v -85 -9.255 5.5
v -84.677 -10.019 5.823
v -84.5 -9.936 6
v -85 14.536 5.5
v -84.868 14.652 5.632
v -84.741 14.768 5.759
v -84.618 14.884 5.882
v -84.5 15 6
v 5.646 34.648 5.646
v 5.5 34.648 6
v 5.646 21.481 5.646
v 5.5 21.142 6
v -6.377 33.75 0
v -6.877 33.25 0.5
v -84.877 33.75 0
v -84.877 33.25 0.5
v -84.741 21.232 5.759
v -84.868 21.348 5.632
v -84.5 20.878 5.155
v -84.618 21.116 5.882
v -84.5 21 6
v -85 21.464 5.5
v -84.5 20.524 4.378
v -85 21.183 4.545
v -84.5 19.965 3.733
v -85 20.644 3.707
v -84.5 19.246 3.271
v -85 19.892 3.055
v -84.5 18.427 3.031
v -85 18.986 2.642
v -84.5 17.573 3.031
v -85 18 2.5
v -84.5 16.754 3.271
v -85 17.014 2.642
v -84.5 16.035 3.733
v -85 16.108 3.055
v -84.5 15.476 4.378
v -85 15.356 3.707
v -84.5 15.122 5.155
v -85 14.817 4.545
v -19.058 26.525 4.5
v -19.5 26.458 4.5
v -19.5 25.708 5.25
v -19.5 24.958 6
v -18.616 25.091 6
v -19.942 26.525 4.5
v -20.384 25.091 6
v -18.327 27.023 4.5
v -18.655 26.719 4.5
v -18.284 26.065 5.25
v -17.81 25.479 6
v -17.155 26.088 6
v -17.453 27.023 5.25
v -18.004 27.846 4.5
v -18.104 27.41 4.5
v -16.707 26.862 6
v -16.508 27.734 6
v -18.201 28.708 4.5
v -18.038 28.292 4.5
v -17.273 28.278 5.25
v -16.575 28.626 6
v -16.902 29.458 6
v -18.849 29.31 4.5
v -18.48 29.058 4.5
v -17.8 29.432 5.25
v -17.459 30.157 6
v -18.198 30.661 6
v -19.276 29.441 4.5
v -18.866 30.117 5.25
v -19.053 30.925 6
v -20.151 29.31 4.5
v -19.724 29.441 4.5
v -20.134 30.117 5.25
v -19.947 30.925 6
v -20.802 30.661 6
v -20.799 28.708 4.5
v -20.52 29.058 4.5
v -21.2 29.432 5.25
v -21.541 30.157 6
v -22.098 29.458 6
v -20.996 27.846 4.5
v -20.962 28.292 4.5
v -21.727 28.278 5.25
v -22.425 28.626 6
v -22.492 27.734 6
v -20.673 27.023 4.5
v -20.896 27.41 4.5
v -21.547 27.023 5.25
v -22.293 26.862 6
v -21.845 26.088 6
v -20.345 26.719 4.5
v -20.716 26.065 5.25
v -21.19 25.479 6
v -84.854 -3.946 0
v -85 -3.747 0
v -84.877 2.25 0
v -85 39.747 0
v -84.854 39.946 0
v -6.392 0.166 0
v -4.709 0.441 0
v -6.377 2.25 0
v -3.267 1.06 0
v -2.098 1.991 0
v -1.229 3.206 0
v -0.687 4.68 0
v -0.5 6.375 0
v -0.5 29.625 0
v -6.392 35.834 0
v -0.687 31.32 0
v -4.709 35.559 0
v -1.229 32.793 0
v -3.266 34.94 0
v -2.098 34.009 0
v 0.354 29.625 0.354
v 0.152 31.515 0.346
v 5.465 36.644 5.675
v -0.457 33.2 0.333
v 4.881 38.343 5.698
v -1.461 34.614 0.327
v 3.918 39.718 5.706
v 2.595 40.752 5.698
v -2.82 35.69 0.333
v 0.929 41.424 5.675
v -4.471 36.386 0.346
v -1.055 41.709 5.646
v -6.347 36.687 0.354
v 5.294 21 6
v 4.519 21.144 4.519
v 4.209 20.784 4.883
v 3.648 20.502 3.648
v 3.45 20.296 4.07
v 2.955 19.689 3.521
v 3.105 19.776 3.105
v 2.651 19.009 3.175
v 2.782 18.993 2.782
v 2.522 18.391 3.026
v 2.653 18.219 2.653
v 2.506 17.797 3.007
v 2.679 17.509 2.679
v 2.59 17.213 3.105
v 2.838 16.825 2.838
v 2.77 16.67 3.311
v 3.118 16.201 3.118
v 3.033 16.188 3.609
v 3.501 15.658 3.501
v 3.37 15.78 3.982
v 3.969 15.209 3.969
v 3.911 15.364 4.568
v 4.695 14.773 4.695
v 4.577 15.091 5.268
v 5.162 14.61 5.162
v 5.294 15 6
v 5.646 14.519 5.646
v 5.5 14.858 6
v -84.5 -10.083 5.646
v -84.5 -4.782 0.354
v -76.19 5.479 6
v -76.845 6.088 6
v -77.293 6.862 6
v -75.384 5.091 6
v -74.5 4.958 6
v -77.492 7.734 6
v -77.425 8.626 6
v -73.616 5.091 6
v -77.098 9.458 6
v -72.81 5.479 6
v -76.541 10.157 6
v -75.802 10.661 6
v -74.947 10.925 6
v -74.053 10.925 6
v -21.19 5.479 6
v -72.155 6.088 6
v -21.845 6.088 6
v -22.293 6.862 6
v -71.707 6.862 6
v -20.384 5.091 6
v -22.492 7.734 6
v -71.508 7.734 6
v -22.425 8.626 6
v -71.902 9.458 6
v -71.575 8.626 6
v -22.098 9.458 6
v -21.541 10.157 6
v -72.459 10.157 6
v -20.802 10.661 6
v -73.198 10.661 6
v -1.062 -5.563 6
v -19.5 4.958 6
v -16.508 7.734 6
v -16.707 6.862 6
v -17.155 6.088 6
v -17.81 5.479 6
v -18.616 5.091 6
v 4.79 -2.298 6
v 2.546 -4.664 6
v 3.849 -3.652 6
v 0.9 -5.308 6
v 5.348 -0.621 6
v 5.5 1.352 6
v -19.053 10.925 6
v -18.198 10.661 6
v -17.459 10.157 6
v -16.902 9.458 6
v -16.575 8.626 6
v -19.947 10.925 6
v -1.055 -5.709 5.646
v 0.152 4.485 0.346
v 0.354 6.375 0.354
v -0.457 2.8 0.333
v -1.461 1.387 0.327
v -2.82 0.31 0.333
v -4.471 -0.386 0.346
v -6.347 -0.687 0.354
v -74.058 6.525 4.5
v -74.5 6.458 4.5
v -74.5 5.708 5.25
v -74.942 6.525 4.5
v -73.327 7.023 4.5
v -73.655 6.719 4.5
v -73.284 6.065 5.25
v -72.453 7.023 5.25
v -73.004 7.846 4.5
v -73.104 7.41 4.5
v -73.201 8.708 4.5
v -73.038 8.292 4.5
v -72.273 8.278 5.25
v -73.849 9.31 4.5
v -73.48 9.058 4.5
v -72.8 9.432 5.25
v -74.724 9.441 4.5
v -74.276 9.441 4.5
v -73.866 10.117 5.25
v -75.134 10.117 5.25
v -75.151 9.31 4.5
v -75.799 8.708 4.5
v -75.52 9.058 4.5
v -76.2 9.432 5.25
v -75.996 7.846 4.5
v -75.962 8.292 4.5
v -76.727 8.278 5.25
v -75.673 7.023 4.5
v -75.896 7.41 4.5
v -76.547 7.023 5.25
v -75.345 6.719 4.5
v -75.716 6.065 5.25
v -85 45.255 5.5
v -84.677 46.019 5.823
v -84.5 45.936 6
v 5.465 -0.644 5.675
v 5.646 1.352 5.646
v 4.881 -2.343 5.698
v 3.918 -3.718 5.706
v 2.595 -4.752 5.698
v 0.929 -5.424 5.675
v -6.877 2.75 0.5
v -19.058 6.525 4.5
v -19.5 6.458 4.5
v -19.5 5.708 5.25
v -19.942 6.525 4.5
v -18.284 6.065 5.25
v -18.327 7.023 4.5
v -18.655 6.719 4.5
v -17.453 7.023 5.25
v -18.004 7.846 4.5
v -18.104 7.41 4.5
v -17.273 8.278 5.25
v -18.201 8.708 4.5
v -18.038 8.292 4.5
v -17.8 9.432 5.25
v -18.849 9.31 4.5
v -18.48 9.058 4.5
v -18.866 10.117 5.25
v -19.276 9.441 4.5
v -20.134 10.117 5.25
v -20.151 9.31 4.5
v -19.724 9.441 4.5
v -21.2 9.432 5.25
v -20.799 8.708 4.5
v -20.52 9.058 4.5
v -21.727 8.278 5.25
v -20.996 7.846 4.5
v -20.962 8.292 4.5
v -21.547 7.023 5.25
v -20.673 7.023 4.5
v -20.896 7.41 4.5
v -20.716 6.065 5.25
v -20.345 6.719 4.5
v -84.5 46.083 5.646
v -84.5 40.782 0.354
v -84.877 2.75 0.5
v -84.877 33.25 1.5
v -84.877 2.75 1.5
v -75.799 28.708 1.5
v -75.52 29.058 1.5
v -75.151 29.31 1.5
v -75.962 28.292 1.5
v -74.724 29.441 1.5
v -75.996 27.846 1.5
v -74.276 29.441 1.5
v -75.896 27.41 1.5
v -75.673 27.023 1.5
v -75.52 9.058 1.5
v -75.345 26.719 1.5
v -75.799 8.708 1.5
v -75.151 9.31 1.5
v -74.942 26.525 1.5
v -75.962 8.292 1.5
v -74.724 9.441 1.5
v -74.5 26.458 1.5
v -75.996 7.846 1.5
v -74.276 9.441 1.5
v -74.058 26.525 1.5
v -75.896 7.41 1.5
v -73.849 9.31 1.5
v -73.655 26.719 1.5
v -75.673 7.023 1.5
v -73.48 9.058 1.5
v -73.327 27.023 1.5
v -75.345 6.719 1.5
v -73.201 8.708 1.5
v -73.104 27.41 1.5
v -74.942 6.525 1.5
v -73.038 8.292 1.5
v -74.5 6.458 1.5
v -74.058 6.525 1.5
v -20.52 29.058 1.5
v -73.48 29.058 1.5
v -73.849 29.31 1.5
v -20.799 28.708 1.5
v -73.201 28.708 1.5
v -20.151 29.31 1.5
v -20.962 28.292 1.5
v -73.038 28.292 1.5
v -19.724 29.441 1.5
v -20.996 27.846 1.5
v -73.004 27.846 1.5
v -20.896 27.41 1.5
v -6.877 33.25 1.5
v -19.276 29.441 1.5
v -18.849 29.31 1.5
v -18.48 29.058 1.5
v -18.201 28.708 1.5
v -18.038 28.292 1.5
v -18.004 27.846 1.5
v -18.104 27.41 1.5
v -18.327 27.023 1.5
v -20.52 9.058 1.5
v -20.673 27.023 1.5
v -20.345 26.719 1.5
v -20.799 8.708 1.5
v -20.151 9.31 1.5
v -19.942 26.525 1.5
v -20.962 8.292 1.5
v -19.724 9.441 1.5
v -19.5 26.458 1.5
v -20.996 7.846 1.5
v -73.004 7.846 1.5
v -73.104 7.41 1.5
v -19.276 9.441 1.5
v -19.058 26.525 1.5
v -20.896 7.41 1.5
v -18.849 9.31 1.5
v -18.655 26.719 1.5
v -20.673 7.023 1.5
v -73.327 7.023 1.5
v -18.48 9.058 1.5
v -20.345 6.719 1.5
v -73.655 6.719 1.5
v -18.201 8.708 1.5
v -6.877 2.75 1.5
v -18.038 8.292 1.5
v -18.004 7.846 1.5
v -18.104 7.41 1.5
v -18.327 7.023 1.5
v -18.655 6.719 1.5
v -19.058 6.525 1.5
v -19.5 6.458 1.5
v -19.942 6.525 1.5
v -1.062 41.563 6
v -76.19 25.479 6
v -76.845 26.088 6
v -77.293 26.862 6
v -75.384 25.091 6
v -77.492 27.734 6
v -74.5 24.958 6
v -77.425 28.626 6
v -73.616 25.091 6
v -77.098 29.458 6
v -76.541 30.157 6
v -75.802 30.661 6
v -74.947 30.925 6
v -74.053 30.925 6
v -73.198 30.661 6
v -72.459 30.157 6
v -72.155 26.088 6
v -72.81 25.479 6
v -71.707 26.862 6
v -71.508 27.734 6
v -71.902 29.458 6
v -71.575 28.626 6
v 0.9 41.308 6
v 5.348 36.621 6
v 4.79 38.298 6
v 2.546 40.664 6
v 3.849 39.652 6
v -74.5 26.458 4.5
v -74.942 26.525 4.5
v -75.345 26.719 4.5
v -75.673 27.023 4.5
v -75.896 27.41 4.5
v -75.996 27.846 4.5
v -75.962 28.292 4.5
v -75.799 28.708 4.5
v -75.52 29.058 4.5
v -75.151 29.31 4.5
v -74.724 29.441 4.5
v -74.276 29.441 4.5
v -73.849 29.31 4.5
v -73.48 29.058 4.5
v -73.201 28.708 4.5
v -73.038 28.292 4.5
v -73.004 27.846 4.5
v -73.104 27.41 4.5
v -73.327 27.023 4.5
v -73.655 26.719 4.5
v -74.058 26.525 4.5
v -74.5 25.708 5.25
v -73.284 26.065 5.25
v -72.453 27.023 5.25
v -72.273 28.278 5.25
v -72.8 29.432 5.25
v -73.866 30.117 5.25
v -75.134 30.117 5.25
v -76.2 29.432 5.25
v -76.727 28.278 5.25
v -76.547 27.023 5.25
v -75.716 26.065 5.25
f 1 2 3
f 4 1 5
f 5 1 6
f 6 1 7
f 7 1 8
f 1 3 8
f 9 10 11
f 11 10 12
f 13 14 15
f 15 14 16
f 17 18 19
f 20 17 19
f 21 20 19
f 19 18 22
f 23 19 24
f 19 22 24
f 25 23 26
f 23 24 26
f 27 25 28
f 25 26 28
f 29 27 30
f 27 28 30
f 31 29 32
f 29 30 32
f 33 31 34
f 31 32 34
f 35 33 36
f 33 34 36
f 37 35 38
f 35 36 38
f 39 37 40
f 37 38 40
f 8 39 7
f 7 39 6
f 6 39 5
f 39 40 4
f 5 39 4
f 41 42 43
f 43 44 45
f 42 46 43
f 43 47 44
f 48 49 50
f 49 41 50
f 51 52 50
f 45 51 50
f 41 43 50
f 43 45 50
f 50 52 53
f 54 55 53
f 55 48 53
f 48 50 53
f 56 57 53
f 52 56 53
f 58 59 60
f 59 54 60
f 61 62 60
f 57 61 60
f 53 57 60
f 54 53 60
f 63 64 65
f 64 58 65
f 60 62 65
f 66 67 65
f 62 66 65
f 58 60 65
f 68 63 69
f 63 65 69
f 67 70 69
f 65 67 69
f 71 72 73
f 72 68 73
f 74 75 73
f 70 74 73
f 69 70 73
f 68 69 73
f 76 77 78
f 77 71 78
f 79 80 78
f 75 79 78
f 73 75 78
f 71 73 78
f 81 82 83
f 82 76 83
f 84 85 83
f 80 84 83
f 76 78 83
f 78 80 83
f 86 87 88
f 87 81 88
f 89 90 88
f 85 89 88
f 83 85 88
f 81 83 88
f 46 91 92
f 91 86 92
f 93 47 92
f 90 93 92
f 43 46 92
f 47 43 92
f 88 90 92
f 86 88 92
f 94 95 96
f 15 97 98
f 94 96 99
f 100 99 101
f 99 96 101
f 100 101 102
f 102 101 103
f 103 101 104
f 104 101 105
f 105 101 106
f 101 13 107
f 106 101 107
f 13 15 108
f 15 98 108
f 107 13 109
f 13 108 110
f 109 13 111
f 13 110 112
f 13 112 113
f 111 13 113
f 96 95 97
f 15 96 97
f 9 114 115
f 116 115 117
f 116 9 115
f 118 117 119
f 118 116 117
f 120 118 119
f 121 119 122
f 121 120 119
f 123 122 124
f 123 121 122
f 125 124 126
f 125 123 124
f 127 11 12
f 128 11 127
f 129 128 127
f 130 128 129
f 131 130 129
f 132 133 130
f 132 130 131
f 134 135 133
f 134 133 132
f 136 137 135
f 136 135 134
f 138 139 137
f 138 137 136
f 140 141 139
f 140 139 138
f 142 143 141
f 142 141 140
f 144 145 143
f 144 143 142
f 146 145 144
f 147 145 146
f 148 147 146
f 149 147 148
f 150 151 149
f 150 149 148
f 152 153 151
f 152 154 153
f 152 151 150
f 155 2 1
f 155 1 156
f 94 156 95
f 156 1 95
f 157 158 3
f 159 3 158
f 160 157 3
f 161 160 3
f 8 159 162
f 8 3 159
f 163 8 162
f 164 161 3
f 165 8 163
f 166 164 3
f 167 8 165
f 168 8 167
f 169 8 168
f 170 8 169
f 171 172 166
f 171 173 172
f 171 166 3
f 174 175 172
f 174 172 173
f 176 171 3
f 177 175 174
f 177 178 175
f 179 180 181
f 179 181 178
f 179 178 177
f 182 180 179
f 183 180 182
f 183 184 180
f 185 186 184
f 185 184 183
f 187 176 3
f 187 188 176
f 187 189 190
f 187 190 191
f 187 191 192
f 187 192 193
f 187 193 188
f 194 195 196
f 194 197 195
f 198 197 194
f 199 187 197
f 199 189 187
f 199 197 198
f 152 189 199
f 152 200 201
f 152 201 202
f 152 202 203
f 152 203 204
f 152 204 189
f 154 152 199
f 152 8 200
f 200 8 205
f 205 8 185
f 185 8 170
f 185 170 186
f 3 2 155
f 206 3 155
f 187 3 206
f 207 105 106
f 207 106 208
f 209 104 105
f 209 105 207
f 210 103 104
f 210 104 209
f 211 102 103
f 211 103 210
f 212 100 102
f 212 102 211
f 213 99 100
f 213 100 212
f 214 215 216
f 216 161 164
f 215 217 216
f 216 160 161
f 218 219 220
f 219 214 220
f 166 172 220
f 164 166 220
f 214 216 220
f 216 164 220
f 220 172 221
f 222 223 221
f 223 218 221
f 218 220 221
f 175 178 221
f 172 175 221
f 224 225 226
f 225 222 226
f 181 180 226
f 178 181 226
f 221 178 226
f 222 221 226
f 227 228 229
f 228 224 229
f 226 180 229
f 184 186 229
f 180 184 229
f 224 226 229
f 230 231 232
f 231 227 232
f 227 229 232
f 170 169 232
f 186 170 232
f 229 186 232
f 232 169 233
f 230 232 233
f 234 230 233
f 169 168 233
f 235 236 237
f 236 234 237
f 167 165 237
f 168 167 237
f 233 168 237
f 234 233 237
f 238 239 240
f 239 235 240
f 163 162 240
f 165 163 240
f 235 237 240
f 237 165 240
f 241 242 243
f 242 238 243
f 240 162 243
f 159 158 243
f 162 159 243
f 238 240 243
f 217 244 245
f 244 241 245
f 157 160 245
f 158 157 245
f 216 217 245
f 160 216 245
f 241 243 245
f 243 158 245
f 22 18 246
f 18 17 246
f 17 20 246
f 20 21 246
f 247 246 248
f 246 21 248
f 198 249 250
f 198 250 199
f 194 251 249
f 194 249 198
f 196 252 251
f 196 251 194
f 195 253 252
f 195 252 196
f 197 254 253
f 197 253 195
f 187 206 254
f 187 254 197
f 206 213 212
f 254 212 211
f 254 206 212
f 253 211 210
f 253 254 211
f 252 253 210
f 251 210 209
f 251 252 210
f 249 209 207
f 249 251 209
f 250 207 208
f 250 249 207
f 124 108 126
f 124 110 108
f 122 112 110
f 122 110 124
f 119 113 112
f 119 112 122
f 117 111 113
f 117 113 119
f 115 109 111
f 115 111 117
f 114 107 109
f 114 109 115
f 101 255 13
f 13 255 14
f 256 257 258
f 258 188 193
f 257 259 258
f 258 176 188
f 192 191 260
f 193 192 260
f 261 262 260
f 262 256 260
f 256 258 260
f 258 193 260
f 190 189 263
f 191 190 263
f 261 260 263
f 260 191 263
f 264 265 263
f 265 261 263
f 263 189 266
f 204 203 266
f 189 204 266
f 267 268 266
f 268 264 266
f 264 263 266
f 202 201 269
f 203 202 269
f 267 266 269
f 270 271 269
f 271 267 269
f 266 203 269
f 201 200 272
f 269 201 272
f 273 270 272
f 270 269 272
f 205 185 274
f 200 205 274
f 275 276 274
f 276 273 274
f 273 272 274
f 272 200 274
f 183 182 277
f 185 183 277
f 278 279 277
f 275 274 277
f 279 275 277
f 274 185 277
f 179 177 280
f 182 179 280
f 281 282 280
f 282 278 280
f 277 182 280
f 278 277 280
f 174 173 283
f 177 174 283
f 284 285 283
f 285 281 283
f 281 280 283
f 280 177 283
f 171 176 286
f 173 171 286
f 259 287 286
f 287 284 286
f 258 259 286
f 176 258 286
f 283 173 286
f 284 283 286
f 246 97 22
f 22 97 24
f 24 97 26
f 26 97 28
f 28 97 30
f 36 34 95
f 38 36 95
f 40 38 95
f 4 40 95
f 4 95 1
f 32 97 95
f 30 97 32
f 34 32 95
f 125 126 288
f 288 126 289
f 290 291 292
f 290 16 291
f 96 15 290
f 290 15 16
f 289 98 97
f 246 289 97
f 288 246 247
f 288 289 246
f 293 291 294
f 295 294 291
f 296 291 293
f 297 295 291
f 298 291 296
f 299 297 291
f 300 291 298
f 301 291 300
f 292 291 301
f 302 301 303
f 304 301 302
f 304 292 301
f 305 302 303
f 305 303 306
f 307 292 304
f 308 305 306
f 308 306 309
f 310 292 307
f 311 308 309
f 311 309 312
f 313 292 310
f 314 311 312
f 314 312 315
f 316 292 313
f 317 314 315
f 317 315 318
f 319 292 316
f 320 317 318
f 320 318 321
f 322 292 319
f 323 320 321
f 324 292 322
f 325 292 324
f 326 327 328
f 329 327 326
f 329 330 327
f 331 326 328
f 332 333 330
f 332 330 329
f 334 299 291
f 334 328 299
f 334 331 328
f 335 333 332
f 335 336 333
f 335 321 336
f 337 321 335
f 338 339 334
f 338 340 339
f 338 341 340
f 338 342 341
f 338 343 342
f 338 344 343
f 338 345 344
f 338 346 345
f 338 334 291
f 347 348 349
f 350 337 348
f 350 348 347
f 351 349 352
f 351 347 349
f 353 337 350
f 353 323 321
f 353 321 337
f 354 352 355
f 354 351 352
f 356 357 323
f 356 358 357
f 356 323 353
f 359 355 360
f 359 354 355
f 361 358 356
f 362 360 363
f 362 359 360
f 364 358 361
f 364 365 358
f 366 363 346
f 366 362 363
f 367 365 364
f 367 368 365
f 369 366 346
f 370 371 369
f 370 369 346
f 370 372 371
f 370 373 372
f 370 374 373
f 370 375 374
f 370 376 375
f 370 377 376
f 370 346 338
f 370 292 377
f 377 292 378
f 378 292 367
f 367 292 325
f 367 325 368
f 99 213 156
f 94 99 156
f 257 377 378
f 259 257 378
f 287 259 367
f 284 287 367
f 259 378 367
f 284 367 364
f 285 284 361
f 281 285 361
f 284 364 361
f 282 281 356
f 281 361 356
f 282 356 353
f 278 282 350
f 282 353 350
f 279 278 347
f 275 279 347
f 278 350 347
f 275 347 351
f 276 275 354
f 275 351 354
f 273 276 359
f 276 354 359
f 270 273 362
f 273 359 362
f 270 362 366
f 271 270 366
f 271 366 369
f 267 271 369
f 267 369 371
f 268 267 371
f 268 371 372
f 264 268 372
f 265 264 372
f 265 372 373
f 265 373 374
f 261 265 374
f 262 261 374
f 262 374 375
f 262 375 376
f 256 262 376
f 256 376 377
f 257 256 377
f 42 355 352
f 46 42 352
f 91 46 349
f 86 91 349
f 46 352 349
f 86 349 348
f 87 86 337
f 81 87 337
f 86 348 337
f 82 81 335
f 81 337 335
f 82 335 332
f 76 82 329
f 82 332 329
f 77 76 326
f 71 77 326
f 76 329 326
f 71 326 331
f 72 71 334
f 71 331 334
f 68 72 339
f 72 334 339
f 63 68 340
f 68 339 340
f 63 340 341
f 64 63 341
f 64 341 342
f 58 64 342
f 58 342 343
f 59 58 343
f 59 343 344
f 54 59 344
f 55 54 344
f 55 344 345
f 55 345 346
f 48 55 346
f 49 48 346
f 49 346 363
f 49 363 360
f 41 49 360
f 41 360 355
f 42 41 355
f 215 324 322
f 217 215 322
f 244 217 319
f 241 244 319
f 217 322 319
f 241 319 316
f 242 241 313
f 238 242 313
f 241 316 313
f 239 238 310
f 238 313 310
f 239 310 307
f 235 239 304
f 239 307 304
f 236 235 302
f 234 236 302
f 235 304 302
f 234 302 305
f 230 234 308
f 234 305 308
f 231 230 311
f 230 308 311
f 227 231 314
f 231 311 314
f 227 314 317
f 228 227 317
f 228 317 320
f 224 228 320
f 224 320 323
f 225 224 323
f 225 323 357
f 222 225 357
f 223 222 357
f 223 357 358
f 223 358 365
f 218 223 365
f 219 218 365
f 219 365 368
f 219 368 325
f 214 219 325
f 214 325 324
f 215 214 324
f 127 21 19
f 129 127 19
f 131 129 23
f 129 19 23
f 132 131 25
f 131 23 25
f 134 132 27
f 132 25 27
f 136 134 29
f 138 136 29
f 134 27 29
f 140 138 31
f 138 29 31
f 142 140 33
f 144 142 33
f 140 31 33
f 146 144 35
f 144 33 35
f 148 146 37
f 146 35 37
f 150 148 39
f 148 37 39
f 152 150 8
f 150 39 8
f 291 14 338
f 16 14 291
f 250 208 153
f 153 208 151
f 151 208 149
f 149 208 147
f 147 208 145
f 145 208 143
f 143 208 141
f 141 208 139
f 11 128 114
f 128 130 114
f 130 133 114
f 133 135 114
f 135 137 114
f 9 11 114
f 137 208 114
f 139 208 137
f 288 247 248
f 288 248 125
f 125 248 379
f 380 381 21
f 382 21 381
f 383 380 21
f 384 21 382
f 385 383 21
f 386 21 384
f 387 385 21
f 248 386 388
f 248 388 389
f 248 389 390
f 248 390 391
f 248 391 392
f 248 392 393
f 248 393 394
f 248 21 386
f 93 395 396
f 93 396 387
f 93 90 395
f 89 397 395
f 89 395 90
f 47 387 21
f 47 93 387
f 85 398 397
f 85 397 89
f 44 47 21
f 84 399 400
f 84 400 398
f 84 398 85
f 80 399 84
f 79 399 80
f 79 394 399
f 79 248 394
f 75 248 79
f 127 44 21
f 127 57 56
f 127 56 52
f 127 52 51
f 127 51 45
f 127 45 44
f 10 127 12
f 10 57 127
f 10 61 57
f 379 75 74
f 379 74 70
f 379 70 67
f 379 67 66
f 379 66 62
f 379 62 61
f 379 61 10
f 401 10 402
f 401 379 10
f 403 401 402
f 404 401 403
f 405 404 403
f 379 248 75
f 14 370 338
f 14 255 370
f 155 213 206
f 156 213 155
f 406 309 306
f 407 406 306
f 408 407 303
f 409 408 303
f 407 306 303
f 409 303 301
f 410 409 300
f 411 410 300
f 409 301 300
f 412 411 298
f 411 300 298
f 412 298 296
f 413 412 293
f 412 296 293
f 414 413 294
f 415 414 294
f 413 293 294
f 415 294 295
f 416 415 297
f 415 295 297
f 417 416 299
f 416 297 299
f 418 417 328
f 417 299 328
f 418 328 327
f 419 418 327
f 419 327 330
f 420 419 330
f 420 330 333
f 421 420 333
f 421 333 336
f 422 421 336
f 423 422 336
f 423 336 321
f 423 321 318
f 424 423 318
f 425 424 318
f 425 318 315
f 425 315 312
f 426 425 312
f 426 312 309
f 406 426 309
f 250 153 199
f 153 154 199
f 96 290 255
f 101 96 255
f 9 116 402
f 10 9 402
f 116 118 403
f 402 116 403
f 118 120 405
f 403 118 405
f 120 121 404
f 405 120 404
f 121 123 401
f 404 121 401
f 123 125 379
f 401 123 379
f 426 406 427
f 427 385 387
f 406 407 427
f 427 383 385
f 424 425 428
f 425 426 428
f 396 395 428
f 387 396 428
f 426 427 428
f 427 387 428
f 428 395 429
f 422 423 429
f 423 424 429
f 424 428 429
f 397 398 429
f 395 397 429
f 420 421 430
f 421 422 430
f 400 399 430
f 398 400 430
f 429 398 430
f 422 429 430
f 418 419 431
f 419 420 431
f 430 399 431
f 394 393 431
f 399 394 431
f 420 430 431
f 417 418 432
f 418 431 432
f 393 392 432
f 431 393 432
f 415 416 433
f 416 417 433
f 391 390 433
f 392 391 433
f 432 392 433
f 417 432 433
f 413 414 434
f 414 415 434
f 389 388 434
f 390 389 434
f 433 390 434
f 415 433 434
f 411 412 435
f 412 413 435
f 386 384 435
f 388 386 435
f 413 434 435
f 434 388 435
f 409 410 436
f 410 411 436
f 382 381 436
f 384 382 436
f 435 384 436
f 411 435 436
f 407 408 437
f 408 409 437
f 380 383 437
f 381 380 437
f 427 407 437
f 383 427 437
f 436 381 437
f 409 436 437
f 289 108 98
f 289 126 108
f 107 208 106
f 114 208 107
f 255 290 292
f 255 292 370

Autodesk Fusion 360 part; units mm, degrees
sketch "Sketch1" plane through (0, 0, 0) normal (0, 0, 1) x (1, 0, 0)
  line L0 (0, 0) -> (-89.8767, -4.7102)
  line L1 (0, 0) -> (90, 0) construction
  line L2 (0, 0) -> (0, 36)
  line L3 (0, 36) -> (-89.8767, 40.7102)
  line L4 (0, 36) -> (90, 36) construction
  line L5 (-89.8767, 40.7102) -> (-89.8767, -4.7102)
  dimension "d1" = 177
  dimension "d2" = 90
  dimension "d3" = 36
  dimension "d4" = 177
  dimension "d5" = 90
extrude "Extrude1" add sketch "Sketch1" along normal blind 6 draft 45
fillet "Fillet1" radius 10 2 edges at (3, -2.8469, 3) (3, 38.8469, 3)
sketch "Sketch2" plane through (0, 0, 0) normal (0, 0, -1) x (1, 0, 0)
  ellipse E0 centre (-14.1421, -22.5796) end of major axis (-1.7883, -34.3029) minor radius 10 (-6.701, -36.3512) -> (0, -29.2898) ccw
  line L0 (0, -29.2898) -> (0, -6.7102)
  ellipse E1 centre (-14.1421, -13.4204) end of major axis (-1.7883, -1.6971) minor radius 10 (0, -6.7102) -> (-6.701, 0.3512) ccw
  line L1 (-6.701, 0.3512) -> (-89.8767, 4.7102)
  line L2 (-89.8767, 4.7102) -> (-89.8767, -40.7102)
  line L3 (-89.8767, -40.7102) -> (-6.701, -36.3512)
  line L4 (-89.8767, 4.7102) -> (-89.8767, -18) construction
  line L5 (-89.8767, -18) -> (-45.8767, -18) construction
  line L6 (-6.8767, -33.25) -> (-84.8767, -33.25)
  line L7 (-84.8767, -33.25) -> (-84.8767, -2.75)
  line L8 (-84.8767, -2.75) -> (-6.8767, -2.75)
  line L9 (-6.8767, -2.75) -> (-6.8767, -33.25)
  line L10 (-6.8767, -33.25) -> (-84.8767, -2.75) construction
  line L11 (-84.8767, -33.25) -> (-6.8767, -2.75) construction
  point P0 (-45.8767, -18)
  dimension "d10" = 22.7102
  dimension "d11" = 44
  dimension "d12" = 78
  dimension "d13" = 30.5
extrude "Extrude2" cut sketch "Sketch2" against normal blind 1.5 contours L6 L7 L8 L9
sketch "Sketch3" plane through (0, 0, 0) normal (0, 0, -1) x (1, 0, 0)
  line L0 (-84.8767, -33.25) -> (-84.8767, -2.75)
  line L1 (-84.8767, -2.75) -> (-6.8767, -2.75)
  line L2 (-6.8767, -2.75) -> (-6.8767, -33.25)
  line L3 (-6.8767, -33.25) -> (-84.8767, -33.25)
  ellipse E0 centre (-14.1421, -22.5796) end of major axis (-1.7883, -34.3029) minor radius 10 (-6.701, -36.3512) -> (0, -29.2898) ccw
  line L4 (0, -29.2898) -> (0, -6.7102)
  ellipse E1 centre (-14.1421, -13.4204) end of major axis (-1.7883, -1.6971) minor radius 10 (0, -6.7102) -> (-6.701, 0.3512) ccw
  line L5 (-6.701, 0.3512) -> (-89.8767, 4.7102)
  line L6 (-89.8767, 4.7102) -> (-89.8767, -40.7102)
  line L7 (-89.8767, -40.7102) -> (-6.701, -36.3512)
sketch "Sketch4" plane through (0, 0, 0) normal (0, 0, -1) x (1, 0, 0)
  line L0 (-85, -15) -> (-85, 16.158)
  line L1 (-85, 16.158) -> (-101.3363, 16.158)
  line L2 (-101.3363, 16.158) -> (-101.3363, -48.0286)
  line L3 (-101.3363, -48.0286) -> (-85, -48.0286)
  line L4 (-85, -48.0286) -> (-85, -15)
extrude "Extrude3" cut sketch "Sketch4" against normal blind 15
sketch "Sketch5" plane through (-85, 0, 0) normal (-1, 0, 0) x (0, -1, 0)
  line L0 (4.4547, 0) -> (10.4629, 6)
  line L1 (10.4629, 6) -> (-46.4629, 6)
  line L2 (-46.4629, 6) -> (-40.4547, 0)
  line L3 (-40.4547, 0) -> (4.4547, 0)
  line L4 (-46.4629, 6) -> (-18, 6)
  line L5 (10.4629, 6) -> (-18, 6)
  circle A0 centre (-18, 6) radius 3
  dimension "d18" = 28.4629
  dimension "d19" = 6
extrude "Extrude4" cut sketch "Sketch5" against normal blind 100 contours L1 L4 L5 A0 picked at (-19.9888, 5.851)
chamfer "Chamfer1" distance 0.5 angle 45 10 edges at (-42.8505, -8.2539, 6) (6, 8.0082, 6) (4.2117, -3.9967, 6) (3, 18, 3) (6, 27.9918, 6) (-42.8505, 44.2539, 6) (4.2117, 39.9967, 6) (-85, 33.7314, 6) (-85, 18, 3) (-85, 2.2686, 6)
chamfer "Chamfer2" distance 0.5 angle 45 10 edges at (-1.7883, 34.3029, 0) (-45.8505, 38.4029, 0) (-45.8505, -2.4029, 0) (-1.7883, 1.6971, 0) (0, 18, 0) (-85, -7.2084, 2.75) (-85, 43.2084, 2.75) (-45.8767, 33.25, 0) (-6.8767, 18, 0) (-45.8767, 2.75, 0)
sketch "Sketch6" plane through (0, 0, 6) normal (0, 0, 1) x (-1, 0, 0)
  spline S0 degree 3 poles (-5.2935, -15) (-5.3627, -14.9531) (-5.4315, -14.9058) (-5.5, -14.8582) knots 0 0 0 0 0.025071 0.025071 0.025071 0.025071
  line L0 (-5.2935, -15) -> (84.5, -15)
  line L1 (84.5, -15) -> (84.5, 9.936)
  line L2 (84.5, 9.936) -> (1.0622, 5.5632)
  line L3 (0.7272, 5.5457) -> (1.0622, 5.5632)
  spline S1 degree 3 poles (-5.5, -1.0164) (-5.5, -0.8241) (-5.4943, -0.6349) (-5.4197, 0.5909) (-5.1793, 1.5237) (-4.5302, 2.8177) (-4.2188, 3.2629) (-3.849, 3.6526) (-3.4792, 4.0422) (-3.051, 4.3765) (-1.7926, 5.0924) (-0.8738, 5.3813) (0.3465, 5.52) (0.5351, 5.5356) (0.7272, 5.5457) knots -0.508354 -0.508354 -0.508354 -0.508354 -0.45799 -0.45799 -0.17615 -0.17615 0 0 0 0.17615 0.17615 0.45799 0.45799 0.508354 0.508354 0.508354 0.508354
  line L4 (-5.5, -1.3519) -> (-5.5, -1.0164)
  line L5 (-5.5, -1.3519) -> (-5.5, -14.8582)
  line L6 (82, -17.9581) -> (47, -17.9581) construction
  line L7 (74.5, -7.9581) -> (19.5, -7.9581) construction
  line L8 (19.5, -7.9581) -> (19.5, -27.9581) construction
  line L9 (19.5, -27.9581) -> (74.5, -27.9581) construction
  line L10 (74.5, -27.9581) -> (74.5, -7.9581) construction
  line L11 (74.5, -7.9581) -> (19.5, -27.9581) construction
  line L12 (19.5, -7.9581) -> (74.5, -27.9581) construction
  point P0 (47, -17.9581)
  dimension "d24" = 35
  dimension "d25" = 55
  dimension "d26" = 20
hole "Hole1" at (-19.5, 27.9581, 6) at (-19.5, 7.9581, 6) at (-74.5, 27.9581, 6) at (-74.5, 7.9581, 6) direction (0, 0, -1) diameter 3 depth 10 tip angle 118 countersink diameter 6 countersink angle 90
